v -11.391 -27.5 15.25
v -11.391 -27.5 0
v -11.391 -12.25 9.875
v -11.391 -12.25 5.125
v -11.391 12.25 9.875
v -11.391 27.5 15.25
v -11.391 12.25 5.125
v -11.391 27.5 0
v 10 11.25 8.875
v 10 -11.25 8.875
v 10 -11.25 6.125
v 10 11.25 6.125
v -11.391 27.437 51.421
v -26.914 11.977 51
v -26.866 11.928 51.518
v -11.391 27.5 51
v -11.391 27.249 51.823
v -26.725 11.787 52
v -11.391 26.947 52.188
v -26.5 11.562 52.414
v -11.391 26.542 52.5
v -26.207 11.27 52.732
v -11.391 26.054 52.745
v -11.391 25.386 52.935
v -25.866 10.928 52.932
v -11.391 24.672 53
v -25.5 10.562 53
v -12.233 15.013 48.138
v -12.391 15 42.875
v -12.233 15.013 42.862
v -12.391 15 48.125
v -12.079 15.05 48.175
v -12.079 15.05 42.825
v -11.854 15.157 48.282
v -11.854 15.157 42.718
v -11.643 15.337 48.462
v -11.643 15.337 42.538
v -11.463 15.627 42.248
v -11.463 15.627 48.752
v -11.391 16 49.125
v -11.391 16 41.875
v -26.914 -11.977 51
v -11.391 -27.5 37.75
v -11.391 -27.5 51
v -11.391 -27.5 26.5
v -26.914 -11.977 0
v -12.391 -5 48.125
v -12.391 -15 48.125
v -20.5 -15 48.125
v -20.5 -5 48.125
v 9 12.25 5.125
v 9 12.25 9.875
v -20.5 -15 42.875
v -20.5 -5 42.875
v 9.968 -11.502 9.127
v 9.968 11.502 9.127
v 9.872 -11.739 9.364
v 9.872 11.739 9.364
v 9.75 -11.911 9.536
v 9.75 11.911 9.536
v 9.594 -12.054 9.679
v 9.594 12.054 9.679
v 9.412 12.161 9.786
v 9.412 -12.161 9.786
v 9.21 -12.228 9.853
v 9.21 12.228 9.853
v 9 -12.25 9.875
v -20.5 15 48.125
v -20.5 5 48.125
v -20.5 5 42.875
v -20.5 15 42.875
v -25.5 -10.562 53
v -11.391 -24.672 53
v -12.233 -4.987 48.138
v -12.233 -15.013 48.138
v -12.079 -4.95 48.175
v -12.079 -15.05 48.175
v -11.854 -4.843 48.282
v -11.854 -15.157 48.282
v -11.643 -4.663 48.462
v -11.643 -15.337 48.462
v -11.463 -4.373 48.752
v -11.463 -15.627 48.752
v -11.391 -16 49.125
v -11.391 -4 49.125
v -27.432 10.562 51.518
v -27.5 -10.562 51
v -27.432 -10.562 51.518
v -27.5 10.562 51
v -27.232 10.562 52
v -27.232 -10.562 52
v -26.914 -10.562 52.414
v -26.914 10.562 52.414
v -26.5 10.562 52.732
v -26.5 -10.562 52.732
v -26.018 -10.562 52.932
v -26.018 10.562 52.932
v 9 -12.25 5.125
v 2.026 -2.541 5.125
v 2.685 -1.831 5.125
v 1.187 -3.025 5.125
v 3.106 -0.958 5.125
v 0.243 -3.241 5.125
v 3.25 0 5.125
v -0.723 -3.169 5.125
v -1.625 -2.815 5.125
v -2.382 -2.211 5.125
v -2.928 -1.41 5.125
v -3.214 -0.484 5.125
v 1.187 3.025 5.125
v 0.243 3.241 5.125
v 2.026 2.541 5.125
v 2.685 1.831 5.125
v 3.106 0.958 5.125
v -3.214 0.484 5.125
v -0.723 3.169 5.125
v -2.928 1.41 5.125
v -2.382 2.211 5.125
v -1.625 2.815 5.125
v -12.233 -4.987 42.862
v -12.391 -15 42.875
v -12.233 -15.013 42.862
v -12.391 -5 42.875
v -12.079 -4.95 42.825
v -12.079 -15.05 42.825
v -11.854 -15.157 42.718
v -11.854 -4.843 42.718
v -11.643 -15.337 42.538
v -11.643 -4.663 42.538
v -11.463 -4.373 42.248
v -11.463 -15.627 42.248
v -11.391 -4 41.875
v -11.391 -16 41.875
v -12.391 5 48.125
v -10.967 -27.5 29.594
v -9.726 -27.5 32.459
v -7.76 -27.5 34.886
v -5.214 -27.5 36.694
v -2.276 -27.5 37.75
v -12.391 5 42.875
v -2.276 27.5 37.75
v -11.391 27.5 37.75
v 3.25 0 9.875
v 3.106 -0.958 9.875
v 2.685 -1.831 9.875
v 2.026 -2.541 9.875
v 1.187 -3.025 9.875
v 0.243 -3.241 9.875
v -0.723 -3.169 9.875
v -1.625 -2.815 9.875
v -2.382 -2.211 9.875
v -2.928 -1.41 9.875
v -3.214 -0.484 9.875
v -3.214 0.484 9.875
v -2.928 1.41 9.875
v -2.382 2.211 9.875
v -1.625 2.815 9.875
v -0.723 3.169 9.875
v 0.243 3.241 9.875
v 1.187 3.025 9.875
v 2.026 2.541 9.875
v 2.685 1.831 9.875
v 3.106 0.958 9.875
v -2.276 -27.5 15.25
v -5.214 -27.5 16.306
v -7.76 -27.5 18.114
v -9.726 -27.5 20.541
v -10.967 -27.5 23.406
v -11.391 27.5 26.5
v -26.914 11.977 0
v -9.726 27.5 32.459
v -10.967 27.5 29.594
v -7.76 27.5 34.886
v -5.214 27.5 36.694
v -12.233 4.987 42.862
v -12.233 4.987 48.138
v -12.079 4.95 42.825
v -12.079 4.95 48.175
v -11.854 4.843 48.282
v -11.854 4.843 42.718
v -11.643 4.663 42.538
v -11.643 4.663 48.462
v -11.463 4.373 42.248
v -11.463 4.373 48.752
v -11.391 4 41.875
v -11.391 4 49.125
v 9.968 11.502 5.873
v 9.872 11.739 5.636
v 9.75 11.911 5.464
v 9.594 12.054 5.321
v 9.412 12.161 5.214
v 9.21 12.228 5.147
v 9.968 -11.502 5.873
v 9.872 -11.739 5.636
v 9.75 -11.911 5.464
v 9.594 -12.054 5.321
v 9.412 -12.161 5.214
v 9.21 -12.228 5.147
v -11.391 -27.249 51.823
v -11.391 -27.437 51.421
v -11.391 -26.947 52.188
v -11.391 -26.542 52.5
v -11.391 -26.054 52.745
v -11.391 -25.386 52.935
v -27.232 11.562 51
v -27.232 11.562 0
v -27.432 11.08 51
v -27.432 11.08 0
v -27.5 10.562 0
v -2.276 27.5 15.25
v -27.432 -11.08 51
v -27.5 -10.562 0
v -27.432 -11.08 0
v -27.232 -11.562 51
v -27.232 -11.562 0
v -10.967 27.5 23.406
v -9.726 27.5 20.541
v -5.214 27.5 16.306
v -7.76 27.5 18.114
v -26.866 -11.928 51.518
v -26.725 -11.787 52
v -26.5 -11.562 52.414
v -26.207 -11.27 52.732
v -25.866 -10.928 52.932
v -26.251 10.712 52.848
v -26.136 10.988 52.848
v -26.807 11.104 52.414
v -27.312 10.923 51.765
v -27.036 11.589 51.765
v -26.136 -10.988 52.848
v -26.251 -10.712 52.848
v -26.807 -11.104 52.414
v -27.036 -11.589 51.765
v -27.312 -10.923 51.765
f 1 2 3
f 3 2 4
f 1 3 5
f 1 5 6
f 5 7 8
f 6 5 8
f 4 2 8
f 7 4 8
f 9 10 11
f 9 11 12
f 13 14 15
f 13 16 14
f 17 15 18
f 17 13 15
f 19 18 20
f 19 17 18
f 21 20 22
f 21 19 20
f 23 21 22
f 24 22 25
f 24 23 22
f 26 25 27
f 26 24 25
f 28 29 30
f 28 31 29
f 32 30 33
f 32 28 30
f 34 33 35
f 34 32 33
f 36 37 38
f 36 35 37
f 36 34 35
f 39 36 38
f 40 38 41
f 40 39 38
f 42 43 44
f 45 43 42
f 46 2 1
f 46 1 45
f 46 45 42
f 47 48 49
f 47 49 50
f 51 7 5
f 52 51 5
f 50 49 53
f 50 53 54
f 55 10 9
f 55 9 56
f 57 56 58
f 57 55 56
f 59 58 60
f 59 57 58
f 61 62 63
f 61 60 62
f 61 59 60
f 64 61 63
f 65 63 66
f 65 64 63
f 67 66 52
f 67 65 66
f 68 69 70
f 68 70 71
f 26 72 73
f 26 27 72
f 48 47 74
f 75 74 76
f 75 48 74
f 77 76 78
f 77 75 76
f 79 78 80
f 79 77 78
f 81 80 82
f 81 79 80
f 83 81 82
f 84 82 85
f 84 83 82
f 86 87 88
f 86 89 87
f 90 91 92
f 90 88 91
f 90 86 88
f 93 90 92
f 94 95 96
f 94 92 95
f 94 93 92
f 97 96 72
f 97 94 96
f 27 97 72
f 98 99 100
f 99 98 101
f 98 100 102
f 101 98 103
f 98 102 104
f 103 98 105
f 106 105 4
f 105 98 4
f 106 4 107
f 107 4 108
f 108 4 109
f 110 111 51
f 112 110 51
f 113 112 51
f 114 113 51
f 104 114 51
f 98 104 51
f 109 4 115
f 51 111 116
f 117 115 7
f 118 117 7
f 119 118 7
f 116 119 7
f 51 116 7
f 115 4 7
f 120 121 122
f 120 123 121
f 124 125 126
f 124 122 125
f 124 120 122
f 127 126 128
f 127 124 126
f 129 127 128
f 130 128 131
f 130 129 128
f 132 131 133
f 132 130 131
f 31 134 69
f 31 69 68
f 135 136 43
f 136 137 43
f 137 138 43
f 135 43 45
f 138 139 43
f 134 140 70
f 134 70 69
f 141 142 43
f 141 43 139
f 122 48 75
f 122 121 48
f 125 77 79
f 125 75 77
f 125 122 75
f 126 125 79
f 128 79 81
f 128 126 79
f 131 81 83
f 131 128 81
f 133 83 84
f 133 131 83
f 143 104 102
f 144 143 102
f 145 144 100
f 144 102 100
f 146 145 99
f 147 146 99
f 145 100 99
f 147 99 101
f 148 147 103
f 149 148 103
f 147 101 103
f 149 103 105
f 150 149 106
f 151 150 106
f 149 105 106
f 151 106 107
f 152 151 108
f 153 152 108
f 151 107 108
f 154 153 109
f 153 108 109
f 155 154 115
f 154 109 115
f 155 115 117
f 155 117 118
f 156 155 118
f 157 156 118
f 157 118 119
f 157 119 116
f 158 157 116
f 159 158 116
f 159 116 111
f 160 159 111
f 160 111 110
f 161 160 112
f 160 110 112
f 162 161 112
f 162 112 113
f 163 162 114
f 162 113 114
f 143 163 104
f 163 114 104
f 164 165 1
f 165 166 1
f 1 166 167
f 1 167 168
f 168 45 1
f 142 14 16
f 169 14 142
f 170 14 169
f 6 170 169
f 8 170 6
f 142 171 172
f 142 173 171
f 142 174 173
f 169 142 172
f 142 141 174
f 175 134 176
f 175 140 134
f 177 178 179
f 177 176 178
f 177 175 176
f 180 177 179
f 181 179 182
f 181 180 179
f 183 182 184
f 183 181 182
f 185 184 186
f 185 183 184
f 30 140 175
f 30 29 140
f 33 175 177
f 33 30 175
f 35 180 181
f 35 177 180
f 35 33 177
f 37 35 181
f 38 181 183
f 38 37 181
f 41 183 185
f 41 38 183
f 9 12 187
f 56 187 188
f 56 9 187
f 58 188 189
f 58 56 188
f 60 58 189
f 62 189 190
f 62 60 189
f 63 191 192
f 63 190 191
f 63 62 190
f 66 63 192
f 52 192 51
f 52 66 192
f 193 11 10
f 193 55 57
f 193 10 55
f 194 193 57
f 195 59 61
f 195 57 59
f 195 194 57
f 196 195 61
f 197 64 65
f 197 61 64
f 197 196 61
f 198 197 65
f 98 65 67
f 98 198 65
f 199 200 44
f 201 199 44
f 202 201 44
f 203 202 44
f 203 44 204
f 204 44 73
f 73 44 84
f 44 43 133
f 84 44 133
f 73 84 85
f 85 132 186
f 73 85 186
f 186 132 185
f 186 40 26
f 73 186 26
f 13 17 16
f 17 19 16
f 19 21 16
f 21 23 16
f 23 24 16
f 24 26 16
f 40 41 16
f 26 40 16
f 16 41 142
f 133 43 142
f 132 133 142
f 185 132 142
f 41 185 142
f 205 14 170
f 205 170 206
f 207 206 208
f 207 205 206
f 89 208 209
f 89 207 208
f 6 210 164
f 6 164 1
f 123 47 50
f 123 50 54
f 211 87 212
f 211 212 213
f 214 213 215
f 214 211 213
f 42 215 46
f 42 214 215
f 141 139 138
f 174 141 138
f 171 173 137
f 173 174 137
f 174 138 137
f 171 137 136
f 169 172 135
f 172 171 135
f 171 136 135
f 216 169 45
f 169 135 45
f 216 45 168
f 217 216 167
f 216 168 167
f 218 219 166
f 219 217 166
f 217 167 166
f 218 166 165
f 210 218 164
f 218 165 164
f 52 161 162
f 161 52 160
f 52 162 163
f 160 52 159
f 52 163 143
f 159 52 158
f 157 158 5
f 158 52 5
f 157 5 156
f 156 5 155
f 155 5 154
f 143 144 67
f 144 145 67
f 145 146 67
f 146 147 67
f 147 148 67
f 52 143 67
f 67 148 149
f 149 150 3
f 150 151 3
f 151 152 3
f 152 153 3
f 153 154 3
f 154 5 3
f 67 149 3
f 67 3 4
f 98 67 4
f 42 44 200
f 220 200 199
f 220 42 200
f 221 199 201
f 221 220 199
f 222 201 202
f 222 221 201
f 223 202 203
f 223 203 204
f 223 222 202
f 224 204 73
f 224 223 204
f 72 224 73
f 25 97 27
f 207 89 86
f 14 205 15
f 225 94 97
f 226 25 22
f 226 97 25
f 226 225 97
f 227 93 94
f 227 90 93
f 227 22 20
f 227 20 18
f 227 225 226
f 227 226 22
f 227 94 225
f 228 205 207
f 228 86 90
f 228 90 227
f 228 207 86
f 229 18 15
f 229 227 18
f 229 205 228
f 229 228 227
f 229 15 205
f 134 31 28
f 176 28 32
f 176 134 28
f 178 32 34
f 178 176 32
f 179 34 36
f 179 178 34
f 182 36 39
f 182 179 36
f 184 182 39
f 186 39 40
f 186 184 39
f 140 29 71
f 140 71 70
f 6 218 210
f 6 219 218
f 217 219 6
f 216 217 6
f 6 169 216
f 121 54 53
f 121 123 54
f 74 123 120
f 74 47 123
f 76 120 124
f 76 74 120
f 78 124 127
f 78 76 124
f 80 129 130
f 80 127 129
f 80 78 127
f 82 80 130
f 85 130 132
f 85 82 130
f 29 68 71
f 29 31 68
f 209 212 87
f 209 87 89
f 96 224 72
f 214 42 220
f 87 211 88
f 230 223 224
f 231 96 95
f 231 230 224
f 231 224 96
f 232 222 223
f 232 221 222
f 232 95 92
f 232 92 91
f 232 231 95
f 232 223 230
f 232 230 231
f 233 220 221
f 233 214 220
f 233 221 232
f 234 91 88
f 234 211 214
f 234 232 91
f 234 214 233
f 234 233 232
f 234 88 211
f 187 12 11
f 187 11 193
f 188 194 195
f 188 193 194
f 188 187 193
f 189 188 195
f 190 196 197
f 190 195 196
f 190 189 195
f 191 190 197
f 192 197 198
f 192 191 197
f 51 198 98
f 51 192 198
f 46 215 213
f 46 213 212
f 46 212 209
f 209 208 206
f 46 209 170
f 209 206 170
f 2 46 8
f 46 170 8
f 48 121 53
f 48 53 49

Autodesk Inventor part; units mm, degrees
sketch "Skizze1" plane through (0, 0, 0) normal (0, 0, 1) x (1, 0, 0)
  circle A0 centre (0, 0) radius 21
  line L0 (-16.8526, 12.5296) -> (0, 0)
  line L1 (0, 0) -> (-8.33, 19.2772)
  line L2 (0, 0) -> (8.0192, 19.4086)
  line L3 (0, 0) -> (18.1865, 10.5)
  line L4 (0, 0) -> (21, 0) construction
  line L5 (0, 0) -> (-13.5496, -16.044)
  line L6 (0, 0) -> (13.0769, -16.4315)
  circle A1 centre (0, 0) radius 27.5
  circle A2 centre (0, 0) radius 12.5
  line L7 (-27.5, 11.3909) -> (-11.3909, 27.5)
  line L8 (-11.3909, 27.5) -> (11.3909, 27.5)
  line L9 (11.3909, 27.5) -> (27.5, 11.3909)
  line L10 (27.5, 11.3909) -> (27.5, -11.3909)
  line L11 (27.5, -11.3909) -> (11.3909, -27.5)
  line L12 (11.3909, -27.5) -> (-11.3909, -27.5)
  line L13 (-11.3909, -27.5) -> (-27.5, -11.3909)
  line L14 (-27.5, -11.3909) -> (-27.5, 11.3909)
  circle A3 centre (0, 0) radius 3.25
  point P0 (0, 0)
  point P1 (-27.5, 0)
  dimension "d3" = 55
  dimension "d0" = 42
  dimension "d1" = 30
  dimension "d2" = 30
  dimension "d4" = 25
  dimension "d27" = 0
  dimension "d28" = 0
  dimension "d105" = 6.5
extrude "Extrusion21" add sketch "Skizze1" along normal blind 53 contours A0 L6 A2 L3 | L3 A2 L2 A0 | A0 L5 A2 L6 | L2 A2 L1 A0 | A2 L6 A3 L3 | L3 A3 L2 A2 | A0 L0 A2 L5 | A2 L5 A3 L6 | L1 A2 L0 A0 | L2 A3 L1 A2 | A3 L6 L3 | L3 L2 A3 | A2 L0 A3 L5 | A3 L5 L6 | L1 A3 L0 A2 | L2 L1 A3 | L5 A3 L0 | L0 A3 L1 | A1 | L10 L11 A1 | A1 L9 L10 | A1 L8 L9 | L11 L12 A1 | A1 L7 L8 | L12 L13 A1 | A1 L14 L7 | L13 L14 A1
sketch "Skizze18" plane through (0, 0, 0) normal (0, 0, 1) x (1, 0, 0)
  line L0 (-11.3909, 27.5) -> (11.3909, 27.5) projected
  line L1 (-11.3909, 27.5) -> (63.1653, 27.5)
  line L2 (63.1653, 27.5) -> (63.1653, -27.5)
  line L3 (63.1653, -27.5) -> (-11.3909, -27.5)
  line L4 (-11.3909, -27.5) -> (-11.3909, 27.5)
  point P0 (0, 0)
  dimension "d154" = 55
extrude "Extrusion22" cut sketch "Skizze18" along normal through all
sketch "Skizze19" plane through (0, 0, 0) normal (1, 0, 0) x (0, 1, 0)
  line L0 (12.25, 9.875) -> (-12.25, 9.875)
  line L1 (-12.25, 9.875) -> (-12.25, 5.125)
  line L2 (-12.25, 5.125) -> (12.25, 5.125)
  line L3 (12.25, 5.125) -> (12.25, 9.875)
  line L4 (27.5, 0) -> (-27.5, 0) projected
  line L5 (-27.5, 0) -> (-27.5, 53) projected
  point P0 (0, 0)
  dimension "d157" = 24.5
  dimension "d158" = 4.75
  dimension "d159" = 5.125
  dimension "d160" = 39.75
sketch "Skizze20" plane through (0, 0, 0) normal (1, 0, 0) x (0, 1, 0)
  line L0 (-15, 48.125) -> (15, 48.125)
  line L1 (15, 48.125) -> (15, 42.875)
  line L2 (15, 42.875) -> (-15, 42.875)
  line L3 (-15, 42.875) -> (-15, 48.125)
  line L4 (5, 48.125) -> (-5, 48.125)
  line L5 (-5, 48.125) -> (-5, 42.875)
  line L6 (-5, 42.875) -> (5, 42.875)
  line L7 (5, 42.875) -> (5, 48.125)
  line L8 (-27.5, 53) -> (27.5, 53) projected
  point P0 (0, 0)
  dimension "d165" = 30
  dimension "d166" = 5.25
  dimension "d168" = 10
  dimension "d169" = 5.25
  dimension "d170" = 10
  dimension "d171" = 5
  dimension "d172" = 4.875
extrude "Extrusion23" cut sketch "Skizze20" against normal blind 20.5 contours L0 L5 L2 L3 | L0 L1 L2 L7
extrude "Extrusion25" add sketch "Skizze19" along normal blind 10 and the other way blind 25
fillet "Rundung11" radius 2 5 edges at (-19.4454, 19.4454, 53) (-27.5, 0, 53) (-19.4454, -19.4454, 53) (-27.5, -11.3909, 26.5) (-27.5, 11.3909, 26.5)
fillet "Rundung12" radius 1 12 edges at (-11.3909, 15, 45.5) (-11.3909, 10, 42.875) (-11.3909, 5, 45.5) (-11.3909, 10, 48.125) (-11.3909, -5, 45.5) (-11.3909, -10, 42.875) (-11.3909, -15, 45.5) (-11.3909, -10, 48.125) (10, 0, 9.875) (10, -12.25, 7.5) (10, 0, 5.125) (10, 12.25, 7.5)
sketch "Skizze22" plane through (0, 0, 0) normal (0, 1, 0) x (-1, 0, 0)
  line L0 (26.9142, 0) -> (11.3909, 0) projected
  line L1 (11.3909, 0) -> (11.3909, 51) projected
  line L2 (11.3909, 53) -> (25.5, 53) projected
  line L3 (-11.1091, 37.75) -> (-11.1091, 15.25)
  line L4 (11.3909, 15.25) -> (11.3909, 37.75)
  line L5 (11.3909, 37.75) -> (2.2757, 37.75)
  line L6 (-2.494, 37.75) -> (-11.1091, 37.75)
  arc A0 (-2.494, 37.75) -> (-2.494, 15.25) centre (-0.1091, 26.5) ccw
  arc A1 (2.2757, 15.25) -> (2.2757, 37.75) centre (-0.1091, 26.5) ccw
  line L7 (-11.1091, 15.25) -> (-2.494, 15.25)
  line L8 (2.2757, 15.25) -> (11.3909, 15.25)
  line L9 (11.3909, 0) -> (11.3909, 51) projected
  point P0 (0, 0)
  point P1 (11.3909, 26.5)
  dimension "d195" = 26.5
  dimension "d196" = 11.5
  dimension "d197" = 22.5
  dimension "d198" = 22.5
  dimension "d199" = 15.25
  dimension "d200" = 0
extrude "Extrusion26" cut sketch "Skizze1" along normal blind 20 contours A3 L6 L3 | L3 L2 A3 | A3 L5 L6 | L2 L1 A3 | L5 A3 L0 | L0 A3 L1
extrude "Extrusion28" add sketch "Skizze22" along normal mid plane 55 contours L8 A1 L1 | A1 L5 L1
sketch "Skizze12" plane through (0, 0, 14.5) normal (0, 0, 1) x (1, 0, 0)
  circle A0 centre (0, 0) radius 21
  line L0 (-16.8526, 12.5296) -> (-10.0313, 7.4581)
  line L1 (-4.9583, 11.4745) -> (-8.33, 19.2772)
  line L2 (4.7734, 11.5527) -> (8.0192, 19.4086)
  line L3 (10.8253, 6.25) -> (18.1865, 10.5)
  line L4 (0, 0) -> (21, 0) construction
  line L5 (-8.0652, -9.55) -> (-13.5496, -16.044)
  line L6 (7.7839, -9.7807) -> (13.0769, -16.4315)
  circle A1 centre (0, 0) radius 27.5
  circle A2 centre (0, 0) radius 12.5
  line L7 (-27.5, 11.3909) -> (-11.3909, 27.5)
  line L8 (-11.3909, 27.5) -> (11.3909, 27.5)
  line L9 (11.3909, 27.5) -> (27.5, 11.3909)
  line L10 (27.5, 11.3909) -> (27.5, -11.3909)
  line L11 (27.5, -11.3909) -> (11.3909, -27.5)
  line L12 (11.3909, -27.5) -> (-11.3909, -27.5)
  line L13 (-11.3909, -27.5) -> (-27.5, -11.3909)
  line L14 (-27.5, -11.3909) -> (-27.5, 11.3909)
  point P0 (0, 0)
  point P1 (-27.5, 0)
  dimension "d91" = 55
  dimension "d88" = 42
  dimension "d89" = 30
  dimension "d90" = 30
  dimension "d92" = 25
  dimension "d93" = 0
  dimension "d94" = 0
sketch "Skizze13" plane through (0, -27.5, 0) normal (0, 1, 0) x (-1, 0, 0)
  circle A0 centre (0, 41) radius 11.5
  line L0 (-38.5, 14.5) -> (38.5, 14.5) projected
  line L1 (27.5, 0) -> (27.5, 67.5) projected
  point P0 (0, 0)
  point P1 (27.5, 14.5)
  dimension "d100" = 23
  dimension "d101" = 26.5
  dimension "d102" = 27.5
sketch "Skizze14" plane through (0, 0, 0) normal (0, 1, 0) x (-1, 0, 0)
  line L0 (11.3909, 42.5805) -> (11.3909, 39.4195) projected
  line L1 (27.5, 67.5) -> (11.3909, 67.5)
  line L2 (11.3909, 67.5) -> (11.3909, 14.5)
  line L3 (11.3909, 14.5) -> (27.5, 14.5)
  line L4 (27.5, 14.5) -> (27.5, 67.5)
  arc A0 (11.3909, 42.5805) -> (-11.3909, 42.5805) centre (0, 41) ccw projected
  line L5 (0, 52.5) -> (11.3909, 52.5)
  line L6 (11.3909, 52.5) -> (11.3909, 29.5)
  line L7 (11.3909, 29.5) -> (0, 29.5)
  line L8 (0, 29.5) -> (0, 52.5)
  point P0 (0, 0)
  dimension "d108" = 23
  dimension "d111" = 25
  dimension "d112" = 5.25
  dimension "d113" = 5.375
  dimension "d114" = 40
  dimension "d115" = 30
  dimension "d116" = 4.75
  dimension "d117" = 4.875
  dimension "d124" = 10
  dimension "d125" = 4.75
  dimension "d126" = 10
sketch "Skizze16" plane through (-11.391, 0, 0) normal (1, 0, 0) x (0, 1, 0)
  line L0 (-12.5, 25.125) -> (12.5, 25.125)
  line L1 (12.5, 25.125) -> (12.5, 19.875)
  line L2 (12.5, 19.875) -> (-12.5, 19.875)
  line L3 (-12.5, 19.875) -> (-12.5, 25.125)
  line L4 (-15, 62.125) -> (15, 62.125)
  line L5 (15, 62.125) -> (15, 57.375)
  line L6 (15, 57.375) -> (-15, 57.375)
  line L7 (-15, 57.375) -> (-15, 62.125)
  line L8 (5, 62.125) -> (-5, 62.125)
  line L9 (-5, 62.125) -> (-5, 57.375)
  line L10 (-5, 57.375) -> (5, 57.375)
  line L11 (5, 57.375) -> (5, 62.125)
  point P0 (0, 0)
  dimension "d130" = 25
  dimension "d131" = 5.25
  dimension "d134" = 30
  dimension "d135" = 4.75
  dimension "d137" = 10
  dimension "d138" = 4.75
  dimension "d139" = 10
  dimension "d144" = 42
  dimension "d145" = 30
  dimension "d146" = 30
  dimension "d148" = 25
  dimension "d149" = 0
  dimension "d150" = 0
  dimension "d151" = 6.5
sketch "Skizze2" plane through (0, 0, 14.5) normal (0, 0, 1) x (1, 0, 0)
  circle A0 centre (0, 0) radius 21
  line L0 (-16.8526, 12.5296) -> (0, 0)
  line L1 (0, 0) -> (-8.33, 19.2772)
  line L2 (0, 0) -> (8.0192, 19.4086)
  line L3 (0, 0) -> (18.1865, 10.5)
  line L4 (0, 0) -> (21, 0) construction
  line L5 (0, 0) -> (-13.5496, -16.044)
  line L6 (0, 0) -> (13.0769, -16.4315)
  circle A1 centre (0, 0) radius 27.5
  circle A2 centre (0, 0) radius 12.5
  point P0 (0, 0)
  dimension "d11" = 42
  dimension "d12" = 30
  dimension "d13" = 30
  dimension "d14" = 55
  dimension "d15" = 25
  dimension "d29" = 0
  dimension "d30" = 0
sketch "Skizze3" plane through (0, 0, 48) normal (0, 0, 1) x (1, 0, 0)
  circle A0 centre (0, 0) radius 3.25
  dimension "d19" = 6.5
  dimension "d38" = 0
sketch "Skizze6" plane through (0, 0, 14.5) normal (0, 0, 1) x (1, 0, 0)
  circle A0 centre (0, 0) radius 21
  line L0 (-16.8526, 12.5296) -> (0, 0)
  line L1 (0, 0) -> (-8.33, 19.2772)
  line L2 (0, 0) -> (8.0192, 19.4086)
  line L3 (0, 0) -> (18.1865, 10.5)
  line L4 (0, 0) -> (21, 0) construction
  line L5 (0, 0) -> (-13.5496, -16.044)
  line L6 (0, 0) -> (13.0769, -16.4315)
  circle A1 centre (0, 0) radius 27.5
  circle A2 centre (0, 0) radius 12.5
  line L7 (5.2672, -3.0014) -> (0.0343, -6.0622)
  line L8 (0.0343, -6.0622) -> (-5.2328, -3.0608)
  line L9 (-5.2328, -3.0608) -> (-5.2672, 3.0014)
  line L10 (-5.2672, 3.0014) -> (-0.0343, 6.0622)
  line L11 (-0.0343, 6.0622) -> (5.2328, 3.0608)
  line L12 (5.2328, 3.0608) -> (5.2672, -3.0014)
  point P0 (0, 0)
  dimension "d31" = 42
  dimension "d32" = 30
  dimension "d33" = 30
  dimension "d34" = 55
  dimension "d35" = 25
  dimension "d36" = 0
  dimension "d37" = 0
  dimension "d39" = 10.5
sketch "Skizze7" plane through (0, 0, 48) normal (0, 0, 1) x (1, 0, 0)
  circle A0 centre (0, 0) radius 27.5 projected
  line L0 (27.5, -11.3909) -> (11.3909, -27.5)
  line L1 (11.3909, -27.5) -> (-11.3909, -27.5)
  line L2 (-11.3909, -27.5) -> (-27.5, -11.3909)
  line L3 (-27.5, -11.3909) -> (-27.5, 11.3909)
  line L4 (-27.5, 11.3909) -> (-11.3909, 27.5)
  line L5 (-11.3909, 27.5) -> (11.3909, 27.5)
  line L6 (11.3909, 27.5) -> (27.5, 11.3909)
  line L7 (27.5, 11.3909) -> (27.5, -11.3909)
  point P0 (0, 0)
  point P1 (0, 0)
  point P2 (27.5, 0)
  dimension "d45" = 23
  dimension "d46" = 16.5
  dimension "d47" = 43.125
sketch "Skizze9" plane through (27.5, -11.3909, 48) normal (1, 0, 0) x (0, 0, -1)
  circle A0 centre (16.5, 27.0159) radius 9.5
  line L0 (0, 22.7817) -> (0, 0) projected
  line L1 (0, -16.1091) -> (48, -16.1091) projected
  point P0 (-48, 11.3909)
  dimension "d49" = 19
  dimension "d52" = 16.5
  dimension "d53" = 43.125
sketch "Skizze10" plane through (27.5, -11.3909, 48) normal (1, 0, 0) x (0, 0, -1)
  line L0 (25, 43.6027) -> (8, 43.6027)
  line L1 (8, 43.6027) -> (8, 26.6027)
  line L2 (8, 26.6027) -> (25, 26.6027)
  line L3 (25, 26.6027) -> (25, 43.6027)
  ellipse E0 centre (16.5, 26.6027) end of major axis (16.5, 37.9638) minor radius 11.3535 (27.1922, 22.7817) -> (5.8078, 22.7817) ccw projected
  point P0 (48, 11.3909)
  dimension "d58" = 17
  dimension "d59" = 17
  dimension "d60" = 17
  dimension "d61" = 8.5
equation "\"d169\" = d166"
equation "\"d171\" = 0.5 * d168"
equation "\"d196\" = 0.5 * d194"
equation "\"d125\" = d116"
equation "\"d138\" = d135"
equation "\"d52\" = d46"
equation "\"d53\" = d47"
equation "\"d194\" = 23"
properties part number "Stangenbereich_2"
